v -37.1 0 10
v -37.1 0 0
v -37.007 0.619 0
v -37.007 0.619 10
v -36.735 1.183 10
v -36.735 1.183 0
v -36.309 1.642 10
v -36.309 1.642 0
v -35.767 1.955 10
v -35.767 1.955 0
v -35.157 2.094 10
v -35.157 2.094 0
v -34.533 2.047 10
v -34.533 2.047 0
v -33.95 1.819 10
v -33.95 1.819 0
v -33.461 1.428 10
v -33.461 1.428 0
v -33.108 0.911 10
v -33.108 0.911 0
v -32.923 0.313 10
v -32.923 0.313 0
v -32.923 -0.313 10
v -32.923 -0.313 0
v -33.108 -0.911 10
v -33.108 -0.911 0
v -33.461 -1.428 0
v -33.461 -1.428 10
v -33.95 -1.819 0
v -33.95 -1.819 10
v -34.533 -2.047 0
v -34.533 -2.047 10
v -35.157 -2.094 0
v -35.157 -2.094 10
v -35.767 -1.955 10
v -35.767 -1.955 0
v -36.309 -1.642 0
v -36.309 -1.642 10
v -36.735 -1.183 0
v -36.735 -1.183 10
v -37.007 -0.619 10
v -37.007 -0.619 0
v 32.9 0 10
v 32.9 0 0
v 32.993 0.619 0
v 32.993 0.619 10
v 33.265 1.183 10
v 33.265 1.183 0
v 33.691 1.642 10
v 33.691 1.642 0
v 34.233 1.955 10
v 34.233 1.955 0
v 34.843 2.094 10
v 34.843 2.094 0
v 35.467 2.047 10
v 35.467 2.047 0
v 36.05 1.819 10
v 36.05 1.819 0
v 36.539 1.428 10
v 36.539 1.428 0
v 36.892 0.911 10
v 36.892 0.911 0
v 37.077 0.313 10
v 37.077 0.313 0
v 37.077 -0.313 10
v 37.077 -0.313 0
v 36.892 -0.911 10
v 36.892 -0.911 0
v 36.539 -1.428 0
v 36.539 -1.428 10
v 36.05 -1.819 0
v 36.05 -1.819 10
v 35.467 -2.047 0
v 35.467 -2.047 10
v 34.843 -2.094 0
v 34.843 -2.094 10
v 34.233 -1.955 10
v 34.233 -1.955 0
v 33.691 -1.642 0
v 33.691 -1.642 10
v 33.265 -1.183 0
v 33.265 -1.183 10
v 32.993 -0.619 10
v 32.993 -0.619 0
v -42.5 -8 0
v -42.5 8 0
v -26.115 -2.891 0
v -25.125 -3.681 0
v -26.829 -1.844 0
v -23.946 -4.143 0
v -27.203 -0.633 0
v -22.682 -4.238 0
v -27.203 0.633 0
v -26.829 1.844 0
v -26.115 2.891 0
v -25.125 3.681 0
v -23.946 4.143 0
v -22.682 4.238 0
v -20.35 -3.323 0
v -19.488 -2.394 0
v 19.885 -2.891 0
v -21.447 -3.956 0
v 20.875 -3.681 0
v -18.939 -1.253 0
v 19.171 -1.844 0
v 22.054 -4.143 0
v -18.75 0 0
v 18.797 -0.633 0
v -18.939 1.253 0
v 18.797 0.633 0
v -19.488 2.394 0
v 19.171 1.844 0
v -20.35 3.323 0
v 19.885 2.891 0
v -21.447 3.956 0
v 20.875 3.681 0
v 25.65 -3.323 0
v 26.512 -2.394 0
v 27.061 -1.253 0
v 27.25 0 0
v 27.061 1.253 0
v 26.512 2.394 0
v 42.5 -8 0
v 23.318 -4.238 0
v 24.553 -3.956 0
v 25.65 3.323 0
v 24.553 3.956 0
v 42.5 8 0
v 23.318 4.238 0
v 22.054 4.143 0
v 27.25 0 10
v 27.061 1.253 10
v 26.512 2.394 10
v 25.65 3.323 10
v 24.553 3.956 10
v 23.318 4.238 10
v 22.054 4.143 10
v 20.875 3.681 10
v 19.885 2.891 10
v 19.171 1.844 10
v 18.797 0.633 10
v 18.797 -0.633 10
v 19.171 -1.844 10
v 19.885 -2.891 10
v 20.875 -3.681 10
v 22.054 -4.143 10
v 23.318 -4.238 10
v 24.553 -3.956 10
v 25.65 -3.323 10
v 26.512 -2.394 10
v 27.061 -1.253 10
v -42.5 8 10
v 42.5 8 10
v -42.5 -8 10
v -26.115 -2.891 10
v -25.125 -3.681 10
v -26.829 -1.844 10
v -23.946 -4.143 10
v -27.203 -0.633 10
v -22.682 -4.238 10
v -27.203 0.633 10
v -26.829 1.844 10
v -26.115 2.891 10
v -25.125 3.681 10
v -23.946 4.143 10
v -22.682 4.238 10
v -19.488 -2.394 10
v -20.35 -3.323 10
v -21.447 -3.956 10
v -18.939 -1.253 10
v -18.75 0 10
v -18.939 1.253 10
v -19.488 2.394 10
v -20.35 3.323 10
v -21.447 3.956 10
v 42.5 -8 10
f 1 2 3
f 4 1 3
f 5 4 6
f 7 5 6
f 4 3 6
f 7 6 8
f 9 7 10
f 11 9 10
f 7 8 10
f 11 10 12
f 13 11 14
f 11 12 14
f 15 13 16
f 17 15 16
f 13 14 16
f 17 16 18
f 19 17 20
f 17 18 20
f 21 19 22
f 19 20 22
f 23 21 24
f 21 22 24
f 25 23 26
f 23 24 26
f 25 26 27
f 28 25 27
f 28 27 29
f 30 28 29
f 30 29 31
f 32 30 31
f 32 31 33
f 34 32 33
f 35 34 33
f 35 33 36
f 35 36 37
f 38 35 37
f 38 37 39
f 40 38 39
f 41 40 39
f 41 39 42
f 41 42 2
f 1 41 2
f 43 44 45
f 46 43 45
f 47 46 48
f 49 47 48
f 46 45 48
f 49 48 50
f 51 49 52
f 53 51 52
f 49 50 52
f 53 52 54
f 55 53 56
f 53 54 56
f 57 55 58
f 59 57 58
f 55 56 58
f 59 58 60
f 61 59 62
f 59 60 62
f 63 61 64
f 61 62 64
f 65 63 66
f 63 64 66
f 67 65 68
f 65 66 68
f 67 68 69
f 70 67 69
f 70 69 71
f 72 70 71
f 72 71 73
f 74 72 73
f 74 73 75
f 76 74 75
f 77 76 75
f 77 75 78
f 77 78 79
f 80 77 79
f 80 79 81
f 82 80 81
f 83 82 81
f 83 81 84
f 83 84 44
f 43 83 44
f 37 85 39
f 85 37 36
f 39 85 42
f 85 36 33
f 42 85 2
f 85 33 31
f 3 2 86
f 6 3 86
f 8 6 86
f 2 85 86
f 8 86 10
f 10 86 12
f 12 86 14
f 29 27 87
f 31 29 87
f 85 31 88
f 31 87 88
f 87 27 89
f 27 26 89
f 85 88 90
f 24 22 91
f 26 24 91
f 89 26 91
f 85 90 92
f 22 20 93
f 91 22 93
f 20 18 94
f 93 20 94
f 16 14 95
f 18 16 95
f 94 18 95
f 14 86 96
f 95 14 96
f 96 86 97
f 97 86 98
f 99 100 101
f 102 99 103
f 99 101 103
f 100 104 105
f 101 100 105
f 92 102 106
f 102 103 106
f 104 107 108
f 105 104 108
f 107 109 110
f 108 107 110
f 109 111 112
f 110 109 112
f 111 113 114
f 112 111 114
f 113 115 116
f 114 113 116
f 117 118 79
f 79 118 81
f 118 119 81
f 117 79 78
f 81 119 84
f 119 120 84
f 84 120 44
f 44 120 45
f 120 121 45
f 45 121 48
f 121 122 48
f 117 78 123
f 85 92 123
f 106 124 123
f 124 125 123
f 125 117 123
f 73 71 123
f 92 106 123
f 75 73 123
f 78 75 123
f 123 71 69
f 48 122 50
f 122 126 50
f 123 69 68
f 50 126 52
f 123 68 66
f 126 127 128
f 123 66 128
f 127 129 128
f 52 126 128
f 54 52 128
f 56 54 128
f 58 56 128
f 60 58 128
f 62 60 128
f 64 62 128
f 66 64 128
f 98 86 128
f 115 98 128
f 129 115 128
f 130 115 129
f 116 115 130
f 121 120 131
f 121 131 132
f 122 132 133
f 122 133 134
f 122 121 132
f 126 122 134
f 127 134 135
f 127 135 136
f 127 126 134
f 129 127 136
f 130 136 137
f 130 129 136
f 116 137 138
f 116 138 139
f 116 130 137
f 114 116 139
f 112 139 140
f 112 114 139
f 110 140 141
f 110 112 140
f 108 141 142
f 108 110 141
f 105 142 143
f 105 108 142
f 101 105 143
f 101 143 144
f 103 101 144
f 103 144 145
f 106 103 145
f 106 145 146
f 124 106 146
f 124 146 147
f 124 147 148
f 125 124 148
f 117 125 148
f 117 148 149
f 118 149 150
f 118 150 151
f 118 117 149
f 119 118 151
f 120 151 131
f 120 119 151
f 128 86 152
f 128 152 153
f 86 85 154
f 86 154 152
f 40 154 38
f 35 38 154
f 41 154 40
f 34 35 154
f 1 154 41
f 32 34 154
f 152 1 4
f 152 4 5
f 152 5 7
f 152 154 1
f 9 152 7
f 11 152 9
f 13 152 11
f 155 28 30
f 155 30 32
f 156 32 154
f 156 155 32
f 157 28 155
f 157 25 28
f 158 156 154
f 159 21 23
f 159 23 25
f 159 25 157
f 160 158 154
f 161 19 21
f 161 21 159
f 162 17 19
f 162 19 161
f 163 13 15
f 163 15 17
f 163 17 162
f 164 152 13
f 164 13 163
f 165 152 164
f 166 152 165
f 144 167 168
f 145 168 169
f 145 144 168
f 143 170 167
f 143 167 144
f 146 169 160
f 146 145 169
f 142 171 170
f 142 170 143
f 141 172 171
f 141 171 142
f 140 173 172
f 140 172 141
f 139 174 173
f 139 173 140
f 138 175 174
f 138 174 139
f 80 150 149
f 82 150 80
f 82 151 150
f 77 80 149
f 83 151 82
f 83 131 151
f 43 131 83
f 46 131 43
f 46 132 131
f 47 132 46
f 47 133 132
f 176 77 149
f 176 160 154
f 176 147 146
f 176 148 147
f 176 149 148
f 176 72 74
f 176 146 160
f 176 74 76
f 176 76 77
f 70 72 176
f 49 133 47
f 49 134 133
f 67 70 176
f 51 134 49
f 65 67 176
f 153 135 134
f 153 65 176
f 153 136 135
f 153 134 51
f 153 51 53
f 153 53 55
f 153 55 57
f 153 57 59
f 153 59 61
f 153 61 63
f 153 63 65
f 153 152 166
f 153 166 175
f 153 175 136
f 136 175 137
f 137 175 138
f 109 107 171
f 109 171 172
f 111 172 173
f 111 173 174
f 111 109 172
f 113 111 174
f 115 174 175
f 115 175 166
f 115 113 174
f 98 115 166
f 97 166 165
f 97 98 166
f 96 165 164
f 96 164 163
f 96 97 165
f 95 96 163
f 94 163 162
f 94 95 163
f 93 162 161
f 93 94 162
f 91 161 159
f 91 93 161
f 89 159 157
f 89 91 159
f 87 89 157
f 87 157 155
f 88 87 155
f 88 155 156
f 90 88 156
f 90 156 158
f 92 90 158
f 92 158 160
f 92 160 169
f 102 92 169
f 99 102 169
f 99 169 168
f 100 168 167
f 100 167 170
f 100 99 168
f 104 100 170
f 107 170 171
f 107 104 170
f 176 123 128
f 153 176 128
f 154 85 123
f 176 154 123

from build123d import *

# Parameters (mm, degrees)
SKETCH_1_W             = 85
SKETCH_1_H             = 16
SKETCH_1_R             = 4.25
EXTRUDE_1_DEPTH        = 10
HOLE_WIZARD_M5_1_D     = 4.2
HOLE_WIZARD_M5_1_DEPTH = 14.9
HOLE_WIZARD_M5_1_TIP   = 1.2618073


with BuildPart() as part:
    # 草图1 → 凸台-拉伸1 (new body)
    with BuildSketch(Plane.XY):
        Rectangle(SKETCH_1_W, SKETCH_1_H)
        with Locations((-23, 0)):
            Circle(SKETCH_1_R, mode=Mode.SUBTRACT)
        with Locations((23, 0)):
            Circle(SKETCH_1_R, mode=Mode.SUBTRACT)
    extrude(amount=EXTRUDE_1_DEPTH)

    # M5 螺纹孔1
    with Locations(Plane.XY.offset(10)):
        with Locations((-35, 0), (35, 0)):
            Hole(HOLE_WIZARD_M5_1_D / 2, depth=HOLE_WIZARD_M5_1_DEPTH)
            with Locations((0, 0, -(HOLE_WIZARD_M5_1_DEPTH + HOLE_WIZARD_M5_1_TIP / 2))):  # 118° drill point
                Cone(0, HOLE_WIZARD_M5_1_D / 2, HOLE_WIZARD_M5_1_TIP, mode=Mode.SUBTRACT)


solid = part.part
